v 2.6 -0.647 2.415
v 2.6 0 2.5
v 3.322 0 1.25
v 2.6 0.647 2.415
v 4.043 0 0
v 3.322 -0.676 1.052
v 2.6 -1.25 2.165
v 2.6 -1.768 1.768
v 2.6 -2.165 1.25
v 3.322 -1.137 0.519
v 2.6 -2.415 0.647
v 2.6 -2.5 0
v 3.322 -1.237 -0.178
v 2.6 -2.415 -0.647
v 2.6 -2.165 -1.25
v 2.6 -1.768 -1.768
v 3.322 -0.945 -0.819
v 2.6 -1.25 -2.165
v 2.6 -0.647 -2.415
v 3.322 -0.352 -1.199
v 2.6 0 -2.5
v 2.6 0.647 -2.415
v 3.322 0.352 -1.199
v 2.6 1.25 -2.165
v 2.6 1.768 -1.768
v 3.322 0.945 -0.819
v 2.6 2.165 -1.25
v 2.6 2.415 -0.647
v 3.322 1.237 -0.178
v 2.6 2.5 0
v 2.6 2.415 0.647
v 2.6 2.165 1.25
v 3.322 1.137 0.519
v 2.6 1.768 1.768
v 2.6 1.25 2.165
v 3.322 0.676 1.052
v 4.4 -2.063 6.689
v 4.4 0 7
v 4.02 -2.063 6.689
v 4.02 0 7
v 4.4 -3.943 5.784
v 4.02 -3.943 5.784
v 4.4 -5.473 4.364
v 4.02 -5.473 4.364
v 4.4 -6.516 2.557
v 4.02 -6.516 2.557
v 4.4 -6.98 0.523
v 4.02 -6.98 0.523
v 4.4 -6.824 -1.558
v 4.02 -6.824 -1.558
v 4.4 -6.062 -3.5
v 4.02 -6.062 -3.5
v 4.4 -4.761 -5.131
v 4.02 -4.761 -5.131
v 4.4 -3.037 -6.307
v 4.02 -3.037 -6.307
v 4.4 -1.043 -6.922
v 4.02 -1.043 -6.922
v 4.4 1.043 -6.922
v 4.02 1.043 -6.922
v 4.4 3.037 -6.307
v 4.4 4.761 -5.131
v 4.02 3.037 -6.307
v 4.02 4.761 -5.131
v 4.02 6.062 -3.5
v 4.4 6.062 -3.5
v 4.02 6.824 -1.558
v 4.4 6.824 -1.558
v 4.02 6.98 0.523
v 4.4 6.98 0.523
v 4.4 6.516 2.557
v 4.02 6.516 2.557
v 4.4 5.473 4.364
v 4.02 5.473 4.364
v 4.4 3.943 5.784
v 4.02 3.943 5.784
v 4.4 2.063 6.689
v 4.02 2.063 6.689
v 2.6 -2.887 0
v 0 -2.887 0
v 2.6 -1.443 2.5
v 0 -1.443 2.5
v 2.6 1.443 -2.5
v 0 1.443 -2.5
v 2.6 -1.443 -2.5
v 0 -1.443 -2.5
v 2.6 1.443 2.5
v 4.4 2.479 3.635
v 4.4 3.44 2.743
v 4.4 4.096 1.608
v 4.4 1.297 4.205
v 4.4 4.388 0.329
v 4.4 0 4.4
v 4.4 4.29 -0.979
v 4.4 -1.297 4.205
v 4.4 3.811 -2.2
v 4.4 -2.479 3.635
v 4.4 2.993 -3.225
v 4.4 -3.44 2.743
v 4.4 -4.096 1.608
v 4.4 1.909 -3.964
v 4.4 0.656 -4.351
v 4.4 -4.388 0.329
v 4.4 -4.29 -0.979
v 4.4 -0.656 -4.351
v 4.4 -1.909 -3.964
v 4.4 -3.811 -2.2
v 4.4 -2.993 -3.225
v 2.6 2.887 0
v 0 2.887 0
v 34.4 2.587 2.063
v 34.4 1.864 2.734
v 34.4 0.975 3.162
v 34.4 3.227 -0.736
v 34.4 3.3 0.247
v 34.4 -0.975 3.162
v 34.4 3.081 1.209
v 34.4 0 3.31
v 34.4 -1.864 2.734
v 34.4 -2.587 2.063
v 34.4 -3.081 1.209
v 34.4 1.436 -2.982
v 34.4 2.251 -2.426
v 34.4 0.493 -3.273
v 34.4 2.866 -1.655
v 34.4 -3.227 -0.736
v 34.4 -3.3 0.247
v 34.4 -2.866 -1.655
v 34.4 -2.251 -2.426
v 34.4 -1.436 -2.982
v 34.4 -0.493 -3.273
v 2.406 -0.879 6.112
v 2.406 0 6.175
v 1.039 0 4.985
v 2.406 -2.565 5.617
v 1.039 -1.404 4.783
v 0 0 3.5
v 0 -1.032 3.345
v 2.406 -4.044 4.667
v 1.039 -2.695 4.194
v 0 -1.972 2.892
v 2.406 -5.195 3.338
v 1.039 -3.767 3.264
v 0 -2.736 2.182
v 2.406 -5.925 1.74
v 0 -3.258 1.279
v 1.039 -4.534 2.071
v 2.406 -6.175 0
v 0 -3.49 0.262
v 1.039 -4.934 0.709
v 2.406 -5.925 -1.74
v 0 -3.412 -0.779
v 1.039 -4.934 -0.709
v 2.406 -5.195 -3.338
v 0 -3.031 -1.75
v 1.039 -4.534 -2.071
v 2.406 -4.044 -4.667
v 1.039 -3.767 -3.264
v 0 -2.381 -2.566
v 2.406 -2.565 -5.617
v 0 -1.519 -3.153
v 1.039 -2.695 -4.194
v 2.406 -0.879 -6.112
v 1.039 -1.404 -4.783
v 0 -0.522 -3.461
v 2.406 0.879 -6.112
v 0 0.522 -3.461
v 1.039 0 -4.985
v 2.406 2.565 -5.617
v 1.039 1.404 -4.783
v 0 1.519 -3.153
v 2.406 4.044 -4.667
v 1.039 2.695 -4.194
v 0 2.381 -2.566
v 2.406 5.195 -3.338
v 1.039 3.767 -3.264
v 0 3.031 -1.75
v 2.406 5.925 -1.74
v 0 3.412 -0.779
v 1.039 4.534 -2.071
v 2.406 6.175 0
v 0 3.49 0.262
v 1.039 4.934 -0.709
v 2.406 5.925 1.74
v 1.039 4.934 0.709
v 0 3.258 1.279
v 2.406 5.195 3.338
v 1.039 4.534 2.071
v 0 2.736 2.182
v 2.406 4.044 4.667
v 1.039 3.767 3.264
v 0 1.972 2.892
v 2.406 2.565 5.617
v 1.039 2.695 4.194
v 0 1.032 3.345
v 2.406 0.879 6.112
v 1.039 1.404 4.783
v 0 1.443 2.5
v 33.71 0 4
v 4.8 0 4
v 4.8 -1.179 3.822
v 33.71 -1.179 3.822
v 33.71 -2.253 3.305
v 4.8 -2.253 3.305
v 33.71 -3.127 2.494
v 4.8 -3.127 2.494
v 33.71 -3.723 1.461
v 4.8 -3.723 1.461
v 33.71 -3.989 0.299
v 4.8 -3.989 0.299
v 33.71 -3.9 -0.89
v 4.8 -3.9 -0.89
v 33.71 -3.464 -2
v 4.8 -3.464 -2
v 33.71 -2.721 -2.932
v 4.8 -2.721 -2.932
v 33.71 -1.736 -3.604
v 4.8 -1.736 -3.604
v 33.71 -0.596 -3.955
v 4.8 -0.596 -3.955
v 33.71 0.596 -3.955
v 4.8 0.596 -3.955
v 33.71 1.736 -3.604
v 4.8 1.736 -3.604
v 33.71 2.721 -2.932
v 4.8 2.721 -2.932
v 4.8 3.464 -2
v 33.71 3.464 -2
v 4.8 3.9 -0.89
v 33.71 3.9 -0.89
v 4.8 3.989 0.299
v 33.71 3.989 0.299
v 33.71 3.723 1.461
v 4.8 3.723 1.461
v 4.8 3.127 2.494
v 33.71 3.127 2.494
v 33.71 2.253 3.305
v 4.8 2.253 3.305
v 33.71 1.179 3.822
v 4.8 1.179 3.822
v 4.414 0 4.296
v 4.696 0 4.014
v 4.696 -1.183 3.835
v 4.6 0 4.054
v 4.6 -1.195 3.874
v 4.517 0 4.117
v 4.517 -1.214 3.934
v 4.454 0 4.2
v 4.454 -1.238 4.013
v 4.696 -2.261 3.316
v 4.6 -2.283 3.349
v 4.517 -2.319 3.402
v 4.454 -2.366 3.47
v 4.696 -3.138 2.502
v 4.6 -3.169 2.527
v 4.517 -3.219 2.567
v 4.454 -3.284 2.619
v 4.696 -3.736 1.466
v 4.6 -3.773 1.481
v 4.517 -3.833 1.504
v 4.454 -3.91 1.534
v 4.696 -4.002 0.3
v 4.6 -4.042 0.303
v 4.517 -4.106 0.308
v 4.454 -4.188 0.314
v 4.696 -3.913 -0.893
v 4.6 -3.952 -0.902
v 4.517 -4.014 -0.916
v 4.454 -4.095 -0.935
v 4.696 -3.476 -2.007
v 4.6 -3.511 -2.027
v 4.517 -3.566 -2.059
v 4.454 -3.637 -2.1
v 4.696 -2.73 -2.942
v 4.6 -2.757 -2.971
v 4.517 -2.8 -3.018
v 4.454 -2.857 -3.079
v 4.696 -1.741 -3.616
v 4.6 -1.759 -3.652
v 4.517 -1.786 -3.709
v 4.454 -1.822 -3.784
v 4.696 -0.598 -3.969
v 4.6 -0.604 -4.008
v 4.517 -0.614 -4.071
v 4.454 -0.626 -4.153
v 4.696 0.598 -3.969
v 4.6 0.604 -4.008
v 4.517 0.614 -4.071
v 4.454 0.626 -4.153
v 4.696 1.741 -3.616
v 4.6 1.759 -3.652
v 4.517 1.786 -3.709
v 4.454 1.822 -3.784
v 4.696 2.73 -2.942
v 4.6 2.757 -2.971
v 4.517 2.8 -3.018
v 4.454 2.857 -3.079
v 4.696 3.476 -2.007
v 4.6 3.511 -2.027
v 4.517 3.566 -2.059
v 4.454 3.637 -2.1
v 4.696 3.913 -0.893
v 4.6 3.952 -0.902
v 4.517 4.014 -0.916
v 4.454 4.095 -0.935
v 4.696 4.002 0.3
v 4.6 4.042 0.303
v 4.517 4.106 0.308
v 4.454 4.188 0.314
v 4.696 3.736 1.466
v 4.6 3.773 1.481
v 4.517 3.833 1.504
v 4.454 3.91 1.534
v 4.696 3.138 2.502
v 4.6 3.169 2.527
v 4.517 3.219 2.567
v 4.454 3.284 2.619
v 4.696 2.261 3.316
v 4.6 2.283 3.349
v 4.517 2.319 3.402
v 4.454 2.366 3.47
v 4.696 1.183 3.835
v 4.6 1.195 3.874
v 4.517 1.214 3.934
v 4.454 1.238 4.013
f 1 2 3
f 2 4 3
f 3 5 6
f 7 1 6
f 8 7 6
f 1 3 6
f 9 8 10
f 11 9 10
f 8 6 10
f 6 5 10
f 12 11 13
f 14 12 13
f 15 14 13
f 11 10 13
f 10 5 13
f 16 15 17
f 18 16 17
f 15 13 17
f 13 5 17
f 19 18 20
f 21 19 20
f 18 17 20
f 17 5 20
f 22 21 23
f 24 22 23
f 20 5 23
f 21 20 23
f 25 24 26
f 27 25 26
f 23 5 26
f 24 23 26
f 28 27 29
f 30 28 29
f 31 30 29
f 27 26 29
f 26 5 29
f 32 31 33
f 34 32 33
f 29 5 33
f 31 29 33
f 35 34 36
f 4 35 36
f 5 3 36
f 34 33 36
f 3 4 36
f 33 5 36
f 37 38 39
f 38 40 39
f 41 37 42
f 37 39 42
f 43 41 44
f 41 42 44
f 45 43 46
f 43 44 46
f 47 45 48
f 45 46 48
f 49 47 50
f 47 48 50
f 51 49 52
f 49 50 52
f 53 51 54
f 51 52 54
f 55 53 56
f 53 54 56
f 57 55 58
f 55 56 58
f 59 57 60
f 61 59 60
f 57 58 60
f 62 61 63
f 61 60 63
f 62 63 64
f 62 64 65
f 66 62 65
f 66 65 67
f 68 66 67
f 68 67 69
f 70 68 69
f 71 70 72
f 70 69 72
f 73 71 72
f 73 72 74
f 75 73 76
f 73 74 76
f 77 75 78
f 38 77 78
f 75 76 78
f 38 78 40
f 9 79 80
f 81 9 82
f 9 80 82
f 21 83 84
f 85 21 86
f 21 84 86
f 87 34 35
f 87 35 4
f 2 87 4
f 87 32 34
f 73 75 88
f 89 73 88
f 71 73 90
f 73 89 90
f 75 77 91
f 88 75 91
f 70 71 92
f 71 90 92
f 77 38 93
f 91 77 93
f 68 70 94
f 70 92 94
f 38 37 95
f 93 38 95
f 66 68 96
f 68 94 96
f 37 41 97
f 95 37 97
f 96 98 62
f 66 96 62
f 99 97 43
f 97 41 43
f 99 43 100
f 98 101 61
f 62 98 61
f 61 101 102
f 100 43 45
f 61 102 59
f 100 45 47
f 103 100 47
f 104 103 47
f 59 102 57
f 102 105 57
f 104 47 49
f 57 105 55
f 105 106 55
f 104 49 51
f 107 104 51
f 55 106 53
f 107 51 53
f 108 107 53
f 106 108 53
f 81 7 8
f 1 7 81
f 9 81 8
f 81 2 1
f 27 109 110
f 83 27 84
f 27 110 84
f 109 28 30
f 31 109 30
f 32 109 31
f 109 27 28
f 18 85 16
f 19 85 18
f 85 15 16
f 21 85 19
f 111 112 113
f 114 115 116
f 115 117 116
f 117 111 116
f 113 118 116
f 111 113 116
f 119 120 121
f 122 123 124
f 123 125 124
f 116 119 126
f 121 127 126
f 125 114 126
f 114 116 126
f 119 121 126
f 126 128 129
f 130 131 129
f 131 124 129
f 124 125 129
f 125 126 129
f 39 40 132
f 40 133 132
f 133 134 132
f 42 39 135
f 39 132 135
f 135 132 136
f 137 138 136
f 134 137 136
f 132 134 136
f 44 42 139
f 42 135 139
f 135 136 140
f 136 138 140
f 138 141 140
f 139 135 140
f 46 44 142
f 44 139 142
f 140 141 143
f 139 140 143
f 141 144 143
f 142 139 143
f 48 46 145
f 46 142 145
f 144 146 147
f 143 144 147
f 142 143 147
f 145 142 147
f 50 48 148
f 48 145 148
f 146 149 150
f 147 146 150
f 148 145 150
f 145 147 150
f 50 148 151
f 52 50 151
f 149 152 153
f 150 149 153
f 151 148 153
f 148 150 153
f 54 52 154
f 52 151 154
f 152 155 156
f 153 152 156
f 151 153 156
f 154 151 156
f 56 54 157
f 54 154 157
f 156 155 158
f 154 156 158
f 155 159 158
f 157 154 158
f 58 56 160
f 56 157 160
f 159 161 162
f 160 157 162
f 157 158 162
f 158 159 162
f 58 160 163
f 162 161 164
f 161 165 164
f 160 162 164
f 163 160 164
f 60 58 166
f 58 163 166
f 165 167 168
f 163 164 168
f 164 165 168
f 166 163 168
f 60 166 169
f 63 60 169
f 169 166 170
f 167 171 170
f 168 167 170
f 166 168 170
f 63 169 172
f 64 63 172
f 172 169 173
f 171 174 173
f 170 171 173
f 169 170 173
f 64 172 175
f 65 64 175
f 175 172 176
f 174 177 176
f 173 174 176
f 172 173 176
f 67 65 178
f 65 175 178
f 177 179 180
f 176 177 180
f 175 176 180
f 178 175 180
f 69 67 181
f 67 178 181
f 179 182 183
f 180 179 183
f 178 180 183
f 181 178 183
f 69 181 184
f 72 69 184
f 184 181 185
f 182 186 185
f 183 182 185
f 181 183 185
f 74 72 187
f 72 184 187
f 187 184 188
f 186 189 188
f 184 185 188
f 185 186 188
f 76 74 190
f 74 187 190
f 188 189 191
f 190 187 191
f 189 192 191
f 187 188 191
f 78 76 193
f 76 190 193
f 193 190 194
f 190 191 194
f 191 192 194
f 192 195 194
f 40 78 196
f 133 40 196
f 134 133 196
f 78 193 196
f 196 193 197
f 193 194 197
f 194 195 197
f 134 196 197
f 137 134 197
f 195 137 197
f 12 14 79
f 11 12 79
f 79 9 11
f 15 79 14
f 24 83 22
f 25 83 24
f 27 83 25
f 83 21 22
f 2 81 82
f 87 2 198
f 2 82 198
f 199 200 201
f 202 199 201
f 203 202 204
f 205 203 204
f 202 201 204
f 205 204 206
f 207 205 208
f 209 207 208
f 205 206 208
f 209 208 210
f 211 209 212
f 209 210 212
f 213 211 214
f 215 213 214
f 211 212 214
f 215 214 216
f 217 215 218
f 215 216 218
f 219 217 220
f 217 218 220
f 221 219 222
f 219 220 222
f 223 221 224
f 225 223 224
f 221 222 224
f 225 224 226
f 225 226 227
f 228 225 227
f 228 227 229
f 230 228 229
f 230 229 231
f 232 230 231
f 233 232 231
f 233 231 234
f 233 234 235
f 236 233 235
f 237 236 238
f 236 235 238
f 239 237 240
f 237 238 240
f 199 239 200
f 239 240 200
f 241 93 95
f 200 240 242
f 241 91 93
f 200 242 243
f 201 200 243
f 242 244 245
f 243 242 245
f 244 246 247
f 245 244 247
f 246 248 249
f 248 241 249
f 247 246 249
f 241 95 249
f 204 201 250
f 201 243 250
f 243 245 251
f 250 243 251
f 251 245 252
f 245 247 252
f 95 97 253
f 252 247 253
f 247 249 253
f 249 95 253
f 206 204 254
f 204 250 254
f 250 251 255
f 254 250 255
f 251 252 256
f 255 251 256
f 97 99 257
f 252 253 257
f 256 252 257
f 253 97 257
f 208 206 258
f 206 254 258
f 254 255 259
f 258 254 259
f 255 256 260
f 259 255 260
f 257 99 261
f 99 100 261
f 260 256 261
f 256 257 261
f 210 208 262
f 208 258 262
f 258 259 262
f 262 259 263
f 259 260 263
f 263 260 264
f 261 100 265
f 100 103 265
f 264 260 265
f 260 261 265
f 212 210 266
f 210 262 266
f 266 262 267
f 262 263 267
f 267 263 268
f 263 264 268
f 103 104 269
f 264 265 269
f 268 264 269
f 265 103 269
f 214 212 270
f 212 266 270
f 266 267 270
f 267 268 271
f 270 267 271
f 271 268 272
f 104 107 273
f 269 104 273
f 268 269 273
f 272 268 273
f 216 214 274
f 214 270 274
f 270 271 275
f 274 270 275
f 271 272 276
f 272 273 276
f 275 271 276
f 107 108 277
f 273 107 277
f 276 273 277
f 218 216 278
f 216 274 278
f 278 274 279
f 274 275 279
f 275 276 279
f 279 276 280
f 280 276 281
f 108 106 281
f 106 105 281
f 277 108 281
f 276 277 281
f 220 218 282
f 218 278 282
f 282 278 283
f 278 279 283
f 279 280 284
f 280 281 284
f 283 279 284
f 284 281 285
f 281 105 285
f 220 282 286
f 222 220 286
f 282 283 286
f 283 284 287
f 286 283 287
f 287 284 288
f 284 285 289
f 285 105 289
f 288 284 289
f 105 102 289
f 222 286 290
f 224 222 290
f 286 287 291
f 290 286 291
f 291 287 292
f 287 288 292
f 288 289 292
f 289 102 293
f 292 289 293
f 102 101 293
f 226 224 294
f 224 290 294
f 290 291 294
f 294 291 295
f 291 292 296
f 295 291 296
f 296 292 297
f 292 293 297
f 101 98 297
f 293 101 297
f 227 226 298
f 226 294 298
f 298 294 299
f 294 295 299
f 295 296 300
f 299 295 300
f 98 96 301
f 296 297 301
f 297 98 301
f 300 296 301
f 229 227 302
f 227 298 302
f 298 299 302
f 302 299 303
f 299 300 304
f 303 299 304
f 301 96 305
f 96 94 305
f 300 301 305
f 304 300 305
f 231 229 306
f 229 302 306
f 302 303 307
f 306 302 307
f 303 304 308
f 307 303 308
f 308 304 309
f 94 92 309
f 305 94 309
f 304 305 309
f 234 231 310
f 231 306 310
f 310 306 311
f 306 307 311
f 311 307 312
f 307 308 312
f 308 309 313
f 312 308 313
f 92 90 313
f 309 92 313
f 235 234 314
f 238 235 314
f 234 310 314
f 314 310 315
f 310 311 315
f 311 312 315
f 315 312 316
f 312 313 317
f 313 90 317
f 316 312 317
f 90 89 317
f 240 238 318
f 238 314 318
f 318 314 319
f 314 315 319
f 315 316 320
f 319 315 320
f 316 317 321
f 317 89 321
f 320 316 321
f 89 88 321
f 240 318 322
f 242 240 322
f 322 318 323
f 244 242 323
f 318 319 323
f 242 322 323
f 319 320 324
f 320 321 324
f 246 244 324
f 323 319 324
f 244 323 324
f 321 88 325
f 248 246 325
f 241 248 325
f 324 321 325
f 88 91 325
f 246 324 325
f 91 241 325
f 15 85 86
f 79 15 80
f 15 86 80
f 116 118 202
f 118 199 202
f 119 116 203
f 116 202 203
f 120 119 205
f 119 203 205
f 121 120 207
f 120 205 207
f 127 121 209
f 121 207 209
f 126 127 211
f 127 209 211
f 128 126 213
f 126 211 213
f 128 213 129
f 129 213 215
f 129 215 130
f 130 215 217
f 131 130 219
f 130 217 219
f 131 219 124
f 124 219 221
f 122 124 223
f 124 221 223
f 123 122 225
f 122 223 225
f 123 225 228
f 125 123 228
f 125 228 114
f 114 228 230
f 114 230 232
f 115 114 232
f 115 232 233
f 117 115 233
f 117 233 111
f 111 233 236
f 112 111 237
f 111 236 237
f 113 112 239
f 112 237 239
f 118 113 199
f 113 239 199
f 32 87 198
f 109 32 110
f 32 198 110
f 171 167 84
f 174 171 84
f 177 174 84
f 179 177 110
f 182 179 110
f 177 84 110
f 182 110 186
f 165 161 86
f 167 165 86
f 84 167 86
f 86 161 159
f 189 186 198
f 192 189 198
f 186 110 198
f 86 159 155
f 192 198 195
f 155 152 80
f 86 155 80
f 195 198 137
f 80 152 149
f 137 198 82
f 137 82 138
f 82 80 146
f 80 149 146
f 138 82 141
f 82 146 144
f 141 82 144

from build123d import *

# Parameters (mm, degrees)
FILLET1_R   = 0.4
HEX_2_DEPTH = 2.6


with BuildPart() as part:
    # BodySke → BaseBody (revolve)
    with BuildSketch(Plane.XY, mode=Mode.PRIVATE) as basebody_sk:
        with BuildLine():
            Line((34.4, 0), (34.4, 3.3095))
            Line((34.4, 3.3095), (33.7095, 4))
            Line((33.7095, 4), (4.4, 4))
            Line((4.4, 4), (4.4, 7))
            Line((4.4, 7), (4.02, 7))
            ThreePointArc((4.02, 7), (1.686451133, 5.621618984), (0, 3.5))
            Line((0, 3.5), (0, 0))
            Line((0, 0), (34.4, 0))
        make_face()
    revolve(basebody_sk.sketch.rotate(Axis((0, 0, 0), (1, 0, 0)), 90), axis=Axis((0, 0, 0), (1, 0, 0)))  # turned: the seam where the file's is

    # Fillet1
    fillet1_edges = [part.edges().sort_by_distance(p)[0] for p in [
        (4.4, 0, -4),
    ]]
    fillet(fillet1_edges, radius=FILLET1_R)

    # Sketch2 → PreBroach (revolve, cut)
    with BuildSketch(Plane.XY, mode=Mode.PRIVATE) as prebroach_sk:
        Polygon((0, 2.5), (2.6, 2.5), (4.043375673, 0), (0, 0), align=None)
    revolve(prebroach_sk.sketch.rotate(Axis((0, 0, 0), (1, 0, 0)), 90), axis=Axis((0, 0, 0), (1, 0, 0)), mode=Mode.SUBTRACT)  # turned: the seam where the file's is

    # Sketch3 → Hex 2 (cut)
    with BuildSketch(Plane(origin=(0, 0, 0), x_dir=(0, 0, -1), z_dir=(1, 0, 0))):
        Polygon((-2.5, -1.443375673), (-2.5, 1.443375673), (0, 2.886751346), (2.5, 1.443375673), (2.5, -1.443375673), (0, -2.886751346), align=None)
    extrude(amount=HEX_2_DEPTH, mode=Mode.SUBTRACT)


solid = part.part
